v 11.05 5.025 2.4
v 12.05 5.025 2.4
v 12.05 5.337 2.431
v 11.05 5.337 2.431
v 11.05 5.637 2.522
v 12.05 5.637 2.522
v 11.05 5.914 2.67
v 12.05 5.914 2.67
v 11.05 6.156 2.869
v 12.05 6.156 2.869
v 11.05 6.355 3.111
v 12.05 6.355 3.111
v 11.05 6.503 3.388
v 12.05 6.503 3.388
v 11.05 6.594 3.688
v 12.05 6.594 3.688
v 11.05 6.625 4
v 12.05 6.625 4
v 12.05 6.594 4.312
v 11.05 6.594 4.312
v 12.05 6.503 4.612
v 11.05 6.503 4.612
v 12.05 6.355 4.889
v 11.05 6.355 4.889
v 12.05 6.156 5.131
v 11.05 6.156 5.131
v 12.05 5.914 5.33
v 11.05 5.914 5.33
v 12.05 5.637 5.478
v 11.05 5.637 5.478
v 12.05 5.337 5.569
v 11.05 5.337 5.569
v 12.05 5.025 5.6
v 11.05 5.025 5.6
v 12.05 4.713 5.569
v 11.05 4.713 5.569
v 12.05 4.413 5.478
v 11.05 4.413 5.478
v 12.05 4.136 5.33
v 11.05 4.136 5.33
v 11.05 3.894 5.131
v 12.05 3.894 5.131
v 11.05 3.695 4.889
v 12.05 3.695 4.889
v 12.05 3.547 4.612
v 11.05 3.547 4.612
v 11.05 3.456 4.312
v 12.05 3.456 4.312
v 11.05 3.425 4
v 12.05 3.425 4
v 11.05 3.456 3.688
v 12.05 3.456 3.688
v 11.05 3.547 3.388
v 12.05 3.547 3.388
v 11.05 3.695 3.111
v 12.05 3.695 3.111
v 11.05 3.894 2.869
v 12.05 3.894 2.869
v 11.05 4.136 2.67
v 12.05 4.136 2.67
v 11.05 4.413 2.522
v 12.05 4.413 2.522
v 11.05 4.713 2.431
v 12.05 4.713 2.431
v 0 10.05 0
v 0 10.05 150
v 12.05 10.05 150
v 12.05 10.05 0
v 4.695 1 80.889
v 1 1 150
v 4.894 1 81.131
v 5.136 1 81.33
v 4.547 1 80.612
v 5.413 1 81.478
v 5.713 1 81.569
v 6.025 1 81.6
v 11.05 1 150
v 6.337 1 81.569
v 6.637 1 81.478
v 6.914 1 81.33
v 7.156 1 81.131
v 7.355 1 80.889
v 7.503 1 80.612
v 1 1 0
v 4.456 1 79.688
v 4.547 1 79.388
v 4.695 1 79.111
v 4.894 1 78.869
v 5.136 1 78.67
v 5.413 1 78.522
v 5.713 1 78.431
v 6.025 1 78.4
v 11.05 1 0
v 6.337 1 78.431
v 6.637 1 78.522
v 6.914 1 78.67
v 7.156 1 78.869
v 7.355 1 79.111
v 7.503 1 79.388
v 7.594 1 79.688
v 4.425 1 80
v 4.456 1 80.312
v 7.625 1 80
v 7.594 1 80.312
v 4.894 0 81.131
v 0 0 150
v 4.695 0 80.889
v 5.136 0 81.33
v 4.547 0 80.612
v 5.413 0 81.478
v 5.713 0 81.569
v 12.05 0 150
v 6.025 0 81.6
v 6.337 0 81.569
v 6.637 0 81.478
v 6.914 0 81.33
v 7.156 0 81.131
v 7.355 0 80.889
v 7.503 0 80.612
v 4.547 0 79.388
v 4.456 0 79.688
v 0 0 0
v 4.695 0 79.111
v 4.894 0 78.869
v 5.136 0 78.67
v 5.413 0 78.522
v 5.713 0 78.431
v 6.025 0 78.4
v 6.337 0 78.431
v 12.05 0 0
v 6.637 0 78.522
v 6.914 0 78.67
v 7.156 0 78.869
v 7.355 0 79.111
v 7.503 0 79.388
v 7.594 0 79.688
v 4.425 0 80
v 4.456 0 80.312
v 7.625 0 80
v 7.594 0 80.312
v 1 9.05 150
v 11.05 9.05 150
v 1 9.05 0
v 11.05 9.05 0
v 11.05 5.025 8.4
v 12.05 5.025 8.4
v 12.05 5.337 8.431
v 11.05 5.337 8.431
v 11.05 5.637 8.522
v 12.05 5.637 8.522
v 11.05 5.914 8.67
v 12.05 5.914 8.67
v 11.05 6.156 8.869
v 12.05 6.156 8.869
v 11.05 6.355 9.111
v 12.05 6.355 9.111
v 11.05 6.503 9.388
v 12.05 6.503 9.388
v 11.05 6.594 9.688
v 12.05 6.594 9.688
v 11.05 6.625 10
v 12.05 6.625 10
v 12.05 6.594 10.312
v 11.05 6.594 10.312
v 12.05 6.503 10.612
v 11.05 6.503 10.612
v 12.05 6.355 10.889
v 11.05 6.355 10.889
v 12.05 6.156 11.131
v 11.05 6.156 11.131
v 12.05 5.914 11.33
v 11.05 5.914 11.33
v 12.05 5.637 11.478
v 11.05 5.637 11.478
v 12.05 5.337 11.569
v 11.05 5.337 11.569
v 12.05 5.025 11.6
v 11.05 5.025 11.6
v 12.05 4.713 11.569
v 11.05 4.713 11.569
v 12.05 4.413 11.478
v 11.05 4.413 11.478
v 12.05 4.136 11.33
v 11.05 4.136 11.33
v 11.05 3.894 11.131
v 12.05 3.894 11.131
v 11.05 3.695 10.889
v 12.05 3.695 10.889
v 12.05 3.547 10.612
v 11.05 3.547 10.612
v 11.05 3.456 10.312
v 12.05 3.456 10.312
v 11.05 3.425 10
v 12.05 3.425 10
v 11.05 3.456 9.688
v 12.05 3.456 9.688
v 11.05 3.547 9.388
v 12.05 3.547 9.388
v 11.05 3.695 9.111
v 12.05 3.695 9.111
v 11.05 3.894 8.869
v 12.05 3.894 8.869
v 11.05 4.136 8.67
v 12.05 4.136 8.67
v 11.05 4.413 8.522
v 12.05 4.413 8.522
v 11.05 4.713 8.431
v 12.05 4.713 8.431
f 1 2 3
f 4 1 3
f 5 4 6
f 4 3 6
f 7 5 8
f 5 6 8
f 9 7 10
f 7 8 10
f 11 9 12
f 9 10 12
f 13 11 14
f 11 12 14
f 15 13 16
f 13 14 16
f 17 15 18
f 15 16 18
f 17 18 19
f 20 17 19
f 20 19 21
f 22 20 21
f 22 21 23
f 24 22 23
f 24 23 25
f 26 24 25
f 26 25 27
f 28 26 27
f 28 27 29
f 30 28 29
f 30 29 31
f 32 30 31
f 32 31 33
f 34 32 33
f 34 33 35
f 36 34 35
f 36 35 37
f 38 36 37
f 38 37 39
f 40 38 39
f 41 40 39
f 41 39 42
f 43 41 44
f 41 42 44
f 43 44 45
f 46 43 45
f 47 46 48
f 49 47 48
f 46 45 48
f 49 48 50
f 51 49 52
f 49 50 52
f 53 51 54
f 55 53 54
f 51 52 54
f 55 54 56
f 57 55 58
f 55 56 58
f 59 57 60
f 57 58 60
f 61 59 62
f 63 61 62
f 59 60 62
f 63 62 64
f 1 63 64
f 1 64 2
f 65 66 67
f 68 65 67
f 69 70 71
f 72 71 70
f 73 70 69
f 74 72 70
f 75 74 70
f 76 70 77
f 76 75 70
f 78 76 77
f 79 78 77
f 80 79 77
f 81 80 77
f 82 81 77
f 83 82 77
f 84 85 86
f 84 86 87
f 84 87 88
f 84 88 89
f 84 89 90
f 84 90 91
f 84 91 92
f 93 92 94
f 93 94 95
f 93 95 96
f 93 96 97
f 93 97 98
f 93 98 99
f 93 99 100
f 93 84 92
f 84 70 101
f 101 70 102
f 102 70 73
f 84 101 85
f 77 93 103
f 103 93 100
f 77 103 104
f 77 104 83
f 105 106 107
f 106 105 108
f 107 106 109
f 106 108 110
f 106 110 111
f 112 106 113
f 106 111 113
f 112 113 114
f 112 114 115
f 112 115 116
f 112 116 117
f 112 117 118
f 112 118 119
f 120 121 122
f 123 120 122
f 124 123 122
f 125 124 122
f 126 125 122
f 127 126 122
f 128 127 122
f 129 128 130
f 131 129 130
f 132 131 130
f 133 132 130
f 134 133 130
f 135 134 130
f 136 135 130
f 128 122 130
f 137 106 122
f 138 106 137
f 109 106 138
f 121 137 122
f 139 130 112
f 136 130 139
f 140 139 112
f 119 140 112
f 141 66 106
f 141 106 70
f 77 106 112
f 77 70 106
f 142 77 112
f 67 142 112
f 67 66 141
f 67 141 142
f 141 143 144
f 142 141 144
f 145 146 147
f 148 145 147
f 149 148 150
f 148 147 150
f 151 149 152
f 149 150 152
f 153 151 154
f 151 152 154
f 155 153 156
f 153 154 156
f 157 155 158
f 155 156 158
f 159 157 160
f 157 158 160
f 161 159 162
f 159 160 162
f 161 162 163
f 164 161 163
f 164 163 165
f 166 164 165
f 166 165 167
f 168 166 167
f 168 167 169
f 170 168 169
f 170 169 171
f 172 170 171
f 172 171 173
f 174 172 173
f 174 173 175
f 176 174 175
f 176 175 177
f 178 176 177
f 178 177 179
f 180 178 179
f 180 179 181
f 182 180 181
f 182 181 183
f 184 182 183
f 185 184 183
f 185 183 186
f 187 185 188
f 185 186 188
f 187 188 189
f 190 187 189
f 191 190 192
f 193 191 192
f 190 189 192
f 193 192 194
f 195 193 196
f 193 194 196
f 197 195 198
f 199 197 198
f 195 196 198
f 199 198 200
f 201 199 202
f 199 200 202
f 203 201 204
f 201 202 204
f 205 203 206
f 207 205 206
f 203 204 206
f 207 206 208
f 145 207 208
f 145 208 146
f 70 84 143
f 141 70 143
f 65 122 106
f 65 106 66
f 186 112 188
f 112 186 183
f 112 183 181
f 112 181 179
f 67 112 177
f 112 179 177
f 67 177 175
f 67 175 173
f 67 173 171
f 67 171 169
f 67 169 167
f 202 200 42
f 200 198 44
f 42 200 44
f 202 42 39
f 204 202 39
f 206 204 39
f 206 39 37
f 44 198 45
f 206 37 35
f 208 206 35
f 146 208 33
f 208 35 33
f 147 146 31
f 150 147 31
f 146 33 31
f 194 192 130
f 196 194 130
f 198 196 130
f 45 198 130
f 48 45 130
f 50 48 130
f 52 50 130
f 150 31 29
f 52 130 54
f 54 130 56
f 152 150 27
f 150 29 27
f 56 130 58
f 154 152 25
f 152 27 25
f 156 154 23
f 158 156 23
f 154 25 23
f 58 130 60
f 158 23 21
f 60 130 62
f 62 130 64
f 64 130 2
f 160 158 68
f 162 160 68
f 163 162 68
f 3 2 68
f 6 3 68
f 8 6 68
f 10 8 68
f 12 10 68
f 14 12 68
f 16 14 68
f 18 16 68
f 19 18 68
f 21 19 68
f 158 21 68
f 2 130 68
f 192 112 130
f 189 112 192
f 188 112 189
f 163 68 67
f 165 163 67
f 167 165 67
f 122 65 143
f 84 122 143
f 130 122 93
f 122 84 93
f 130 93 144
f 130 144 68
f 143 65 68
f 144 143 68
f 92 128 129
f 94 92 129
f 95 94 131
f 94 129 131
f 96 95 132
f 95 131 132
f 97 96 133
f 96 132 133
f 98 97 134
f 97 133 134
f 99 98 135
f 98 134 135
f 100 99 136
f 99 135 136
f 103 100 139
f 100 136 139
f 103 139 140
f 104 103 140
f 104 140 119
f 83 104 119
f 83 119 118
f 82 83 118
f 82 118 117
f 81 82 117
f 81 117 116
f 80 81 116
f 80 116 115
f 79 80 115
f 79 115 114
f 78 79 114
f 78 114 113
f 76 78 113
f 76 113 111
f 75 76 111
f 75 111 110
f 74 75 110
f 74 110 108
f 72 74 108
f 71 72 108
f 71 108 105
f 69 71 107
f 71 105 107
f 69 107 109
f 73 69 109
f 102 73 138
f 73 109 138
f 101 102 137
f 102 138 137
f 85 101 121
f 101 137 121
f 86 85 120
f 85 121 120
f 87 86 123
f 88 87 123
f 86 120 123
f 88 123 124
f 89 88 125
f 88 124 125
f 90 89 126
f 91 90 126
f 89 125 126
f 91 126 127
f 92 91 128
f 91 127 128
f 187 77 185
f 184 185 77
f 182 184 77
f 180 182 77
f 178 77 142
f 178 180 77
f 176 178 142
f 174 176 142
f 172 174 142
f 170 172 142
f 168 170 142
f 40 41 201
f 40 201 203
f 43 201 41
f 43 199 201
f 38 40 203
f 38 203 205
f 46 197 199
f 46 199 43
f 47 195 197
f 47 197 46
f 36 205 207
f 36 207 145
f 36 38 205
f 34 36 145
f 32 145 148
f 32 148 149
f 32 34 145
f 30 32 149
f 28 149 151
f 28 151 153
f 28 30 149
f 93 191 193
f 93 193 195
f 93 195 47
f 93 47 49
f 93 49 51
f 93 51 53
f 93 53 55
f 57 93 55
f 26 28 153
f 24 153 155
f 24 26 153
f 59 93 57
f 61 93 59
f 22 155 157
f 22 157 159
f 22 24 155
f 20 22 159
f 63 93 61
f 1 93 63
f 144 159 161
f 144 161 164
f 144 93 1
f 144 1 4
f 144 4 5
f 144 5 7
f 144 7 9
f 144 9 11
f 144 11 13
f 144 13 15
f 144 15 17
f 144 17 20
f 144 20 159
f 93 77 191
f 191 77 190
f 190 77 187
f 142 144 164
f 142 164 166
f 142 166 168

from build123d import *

# Parameters (mm, degrees)
ESQUISSE1_W             = 12.05
ESQUISSE1_H             = 10.05
ESQUISSE1_W_2           = 10.05
ESQUISSE1_H_2           = 8.05
EXTRU_MINCE1_DEPTH      = 150
ENL_V_MAT_EXTRU_1_REACH = 152.818
ESQUISSE2_R             = 1.6
ENL_V_MAT_EXTRU_2_REACH = 152.818
ESQUISSE3_R             = 1.6


with BuildPart() as part:
    # Esquisse1 → Extru.-Mince1 (new body)
    with BuildSketch(Plane.XY):
        with Locations((6.025, 5.025)):
            Rectangle(ESQUISSE1_W, ESQUISSE1_H)
        with Locations((6.025, 5.025)):
            Rectangle(ESQUISSE1_W_2, ESQUISSE1_H_2, mode=Mode.SUBTRACT)
    extrude(amount=EXTRU_MINCE1_DEPTH)

    # Esquisse2 → Enlèv. mat.-Extru.1 (cut, up to next)
    with BuildSketch(Plane(origin=(0, 0, 0), x_dir=(-1, 0, 0), z_dir=(0, -1, 0)), mode=Mode.PRIVATE) as enl_v_mat_extru_1_sk1:
        with Locations(Location((-6.025, -80, 0), (0, 0, 90))):
            Circle(ESQUISSE2_R)
    enl_v_mat_extru_1_tool1 = extrude(enl_v_mat_extru_1_sk1.sketch, amount=-ENL_V_MAT_EXTRU_1_REACH, mode=Mode.PRIVATE) & part.part
    add(enl_v_mat_extru_1_tool1.solids().sort_by_distance((6.025, 0, 80))[0], mode=Mode.SUBTRACT)

    # Esquisse3 → Enlèv. mat.-Extru.2 (cut, up to next)
    with BuildSketch(Plane(origin=(12.05, 0, 0), x_dir=(0, 0, -1), z_dir=(1, 0, 0)), mode=Mode.PRIVATE) as enl_v_mat_extru_2_sk1:
        with Locations((-4, 5.025)):
            Circle(ESQUISSE3_R)
    enl_v_mat_extru_2_tool1 = extrude(enl_v_mat_extru_2_sk1.sketch, amount=-ENL_V_MAT_EXTRU_2_REACH, mode=Mode.PRIVATE) & part.part
    # Esquisse3 → Enlèv. mat.-Extru.2 (cut, up to next)
    with BuildSketch(Plane(origin=(12.05, 0, 0), x_dir=(0, 0, -1), z_dir=(1, 0, 0)), mode=Mode.PRIVATE) as enl_v_mat_extru_2_sk2:
        with Locations((-10, 5.025)):
            Circle(ESQUISSE3_R)
    enl_v_mat_extru_2_tool2 = extrude(enl_v_mat_extru_2_sk2.sketch, amount=-ENL_V_MAT_EXTRU_2_REACH, mode=Mode.PRIVATE) & part.part
    add(enl_v_mat_extru_2_tool1.solids().sort_by_distance((12.05, 5.025, 4))[0], mode=Mode.SUBTRACT)
    add(enl_v_mat_extru_2_tool2.solids().sort_by_distance((12.05, 5.025, 10))[0], mode=Mode.SUBTRACT)


solid = part.part
